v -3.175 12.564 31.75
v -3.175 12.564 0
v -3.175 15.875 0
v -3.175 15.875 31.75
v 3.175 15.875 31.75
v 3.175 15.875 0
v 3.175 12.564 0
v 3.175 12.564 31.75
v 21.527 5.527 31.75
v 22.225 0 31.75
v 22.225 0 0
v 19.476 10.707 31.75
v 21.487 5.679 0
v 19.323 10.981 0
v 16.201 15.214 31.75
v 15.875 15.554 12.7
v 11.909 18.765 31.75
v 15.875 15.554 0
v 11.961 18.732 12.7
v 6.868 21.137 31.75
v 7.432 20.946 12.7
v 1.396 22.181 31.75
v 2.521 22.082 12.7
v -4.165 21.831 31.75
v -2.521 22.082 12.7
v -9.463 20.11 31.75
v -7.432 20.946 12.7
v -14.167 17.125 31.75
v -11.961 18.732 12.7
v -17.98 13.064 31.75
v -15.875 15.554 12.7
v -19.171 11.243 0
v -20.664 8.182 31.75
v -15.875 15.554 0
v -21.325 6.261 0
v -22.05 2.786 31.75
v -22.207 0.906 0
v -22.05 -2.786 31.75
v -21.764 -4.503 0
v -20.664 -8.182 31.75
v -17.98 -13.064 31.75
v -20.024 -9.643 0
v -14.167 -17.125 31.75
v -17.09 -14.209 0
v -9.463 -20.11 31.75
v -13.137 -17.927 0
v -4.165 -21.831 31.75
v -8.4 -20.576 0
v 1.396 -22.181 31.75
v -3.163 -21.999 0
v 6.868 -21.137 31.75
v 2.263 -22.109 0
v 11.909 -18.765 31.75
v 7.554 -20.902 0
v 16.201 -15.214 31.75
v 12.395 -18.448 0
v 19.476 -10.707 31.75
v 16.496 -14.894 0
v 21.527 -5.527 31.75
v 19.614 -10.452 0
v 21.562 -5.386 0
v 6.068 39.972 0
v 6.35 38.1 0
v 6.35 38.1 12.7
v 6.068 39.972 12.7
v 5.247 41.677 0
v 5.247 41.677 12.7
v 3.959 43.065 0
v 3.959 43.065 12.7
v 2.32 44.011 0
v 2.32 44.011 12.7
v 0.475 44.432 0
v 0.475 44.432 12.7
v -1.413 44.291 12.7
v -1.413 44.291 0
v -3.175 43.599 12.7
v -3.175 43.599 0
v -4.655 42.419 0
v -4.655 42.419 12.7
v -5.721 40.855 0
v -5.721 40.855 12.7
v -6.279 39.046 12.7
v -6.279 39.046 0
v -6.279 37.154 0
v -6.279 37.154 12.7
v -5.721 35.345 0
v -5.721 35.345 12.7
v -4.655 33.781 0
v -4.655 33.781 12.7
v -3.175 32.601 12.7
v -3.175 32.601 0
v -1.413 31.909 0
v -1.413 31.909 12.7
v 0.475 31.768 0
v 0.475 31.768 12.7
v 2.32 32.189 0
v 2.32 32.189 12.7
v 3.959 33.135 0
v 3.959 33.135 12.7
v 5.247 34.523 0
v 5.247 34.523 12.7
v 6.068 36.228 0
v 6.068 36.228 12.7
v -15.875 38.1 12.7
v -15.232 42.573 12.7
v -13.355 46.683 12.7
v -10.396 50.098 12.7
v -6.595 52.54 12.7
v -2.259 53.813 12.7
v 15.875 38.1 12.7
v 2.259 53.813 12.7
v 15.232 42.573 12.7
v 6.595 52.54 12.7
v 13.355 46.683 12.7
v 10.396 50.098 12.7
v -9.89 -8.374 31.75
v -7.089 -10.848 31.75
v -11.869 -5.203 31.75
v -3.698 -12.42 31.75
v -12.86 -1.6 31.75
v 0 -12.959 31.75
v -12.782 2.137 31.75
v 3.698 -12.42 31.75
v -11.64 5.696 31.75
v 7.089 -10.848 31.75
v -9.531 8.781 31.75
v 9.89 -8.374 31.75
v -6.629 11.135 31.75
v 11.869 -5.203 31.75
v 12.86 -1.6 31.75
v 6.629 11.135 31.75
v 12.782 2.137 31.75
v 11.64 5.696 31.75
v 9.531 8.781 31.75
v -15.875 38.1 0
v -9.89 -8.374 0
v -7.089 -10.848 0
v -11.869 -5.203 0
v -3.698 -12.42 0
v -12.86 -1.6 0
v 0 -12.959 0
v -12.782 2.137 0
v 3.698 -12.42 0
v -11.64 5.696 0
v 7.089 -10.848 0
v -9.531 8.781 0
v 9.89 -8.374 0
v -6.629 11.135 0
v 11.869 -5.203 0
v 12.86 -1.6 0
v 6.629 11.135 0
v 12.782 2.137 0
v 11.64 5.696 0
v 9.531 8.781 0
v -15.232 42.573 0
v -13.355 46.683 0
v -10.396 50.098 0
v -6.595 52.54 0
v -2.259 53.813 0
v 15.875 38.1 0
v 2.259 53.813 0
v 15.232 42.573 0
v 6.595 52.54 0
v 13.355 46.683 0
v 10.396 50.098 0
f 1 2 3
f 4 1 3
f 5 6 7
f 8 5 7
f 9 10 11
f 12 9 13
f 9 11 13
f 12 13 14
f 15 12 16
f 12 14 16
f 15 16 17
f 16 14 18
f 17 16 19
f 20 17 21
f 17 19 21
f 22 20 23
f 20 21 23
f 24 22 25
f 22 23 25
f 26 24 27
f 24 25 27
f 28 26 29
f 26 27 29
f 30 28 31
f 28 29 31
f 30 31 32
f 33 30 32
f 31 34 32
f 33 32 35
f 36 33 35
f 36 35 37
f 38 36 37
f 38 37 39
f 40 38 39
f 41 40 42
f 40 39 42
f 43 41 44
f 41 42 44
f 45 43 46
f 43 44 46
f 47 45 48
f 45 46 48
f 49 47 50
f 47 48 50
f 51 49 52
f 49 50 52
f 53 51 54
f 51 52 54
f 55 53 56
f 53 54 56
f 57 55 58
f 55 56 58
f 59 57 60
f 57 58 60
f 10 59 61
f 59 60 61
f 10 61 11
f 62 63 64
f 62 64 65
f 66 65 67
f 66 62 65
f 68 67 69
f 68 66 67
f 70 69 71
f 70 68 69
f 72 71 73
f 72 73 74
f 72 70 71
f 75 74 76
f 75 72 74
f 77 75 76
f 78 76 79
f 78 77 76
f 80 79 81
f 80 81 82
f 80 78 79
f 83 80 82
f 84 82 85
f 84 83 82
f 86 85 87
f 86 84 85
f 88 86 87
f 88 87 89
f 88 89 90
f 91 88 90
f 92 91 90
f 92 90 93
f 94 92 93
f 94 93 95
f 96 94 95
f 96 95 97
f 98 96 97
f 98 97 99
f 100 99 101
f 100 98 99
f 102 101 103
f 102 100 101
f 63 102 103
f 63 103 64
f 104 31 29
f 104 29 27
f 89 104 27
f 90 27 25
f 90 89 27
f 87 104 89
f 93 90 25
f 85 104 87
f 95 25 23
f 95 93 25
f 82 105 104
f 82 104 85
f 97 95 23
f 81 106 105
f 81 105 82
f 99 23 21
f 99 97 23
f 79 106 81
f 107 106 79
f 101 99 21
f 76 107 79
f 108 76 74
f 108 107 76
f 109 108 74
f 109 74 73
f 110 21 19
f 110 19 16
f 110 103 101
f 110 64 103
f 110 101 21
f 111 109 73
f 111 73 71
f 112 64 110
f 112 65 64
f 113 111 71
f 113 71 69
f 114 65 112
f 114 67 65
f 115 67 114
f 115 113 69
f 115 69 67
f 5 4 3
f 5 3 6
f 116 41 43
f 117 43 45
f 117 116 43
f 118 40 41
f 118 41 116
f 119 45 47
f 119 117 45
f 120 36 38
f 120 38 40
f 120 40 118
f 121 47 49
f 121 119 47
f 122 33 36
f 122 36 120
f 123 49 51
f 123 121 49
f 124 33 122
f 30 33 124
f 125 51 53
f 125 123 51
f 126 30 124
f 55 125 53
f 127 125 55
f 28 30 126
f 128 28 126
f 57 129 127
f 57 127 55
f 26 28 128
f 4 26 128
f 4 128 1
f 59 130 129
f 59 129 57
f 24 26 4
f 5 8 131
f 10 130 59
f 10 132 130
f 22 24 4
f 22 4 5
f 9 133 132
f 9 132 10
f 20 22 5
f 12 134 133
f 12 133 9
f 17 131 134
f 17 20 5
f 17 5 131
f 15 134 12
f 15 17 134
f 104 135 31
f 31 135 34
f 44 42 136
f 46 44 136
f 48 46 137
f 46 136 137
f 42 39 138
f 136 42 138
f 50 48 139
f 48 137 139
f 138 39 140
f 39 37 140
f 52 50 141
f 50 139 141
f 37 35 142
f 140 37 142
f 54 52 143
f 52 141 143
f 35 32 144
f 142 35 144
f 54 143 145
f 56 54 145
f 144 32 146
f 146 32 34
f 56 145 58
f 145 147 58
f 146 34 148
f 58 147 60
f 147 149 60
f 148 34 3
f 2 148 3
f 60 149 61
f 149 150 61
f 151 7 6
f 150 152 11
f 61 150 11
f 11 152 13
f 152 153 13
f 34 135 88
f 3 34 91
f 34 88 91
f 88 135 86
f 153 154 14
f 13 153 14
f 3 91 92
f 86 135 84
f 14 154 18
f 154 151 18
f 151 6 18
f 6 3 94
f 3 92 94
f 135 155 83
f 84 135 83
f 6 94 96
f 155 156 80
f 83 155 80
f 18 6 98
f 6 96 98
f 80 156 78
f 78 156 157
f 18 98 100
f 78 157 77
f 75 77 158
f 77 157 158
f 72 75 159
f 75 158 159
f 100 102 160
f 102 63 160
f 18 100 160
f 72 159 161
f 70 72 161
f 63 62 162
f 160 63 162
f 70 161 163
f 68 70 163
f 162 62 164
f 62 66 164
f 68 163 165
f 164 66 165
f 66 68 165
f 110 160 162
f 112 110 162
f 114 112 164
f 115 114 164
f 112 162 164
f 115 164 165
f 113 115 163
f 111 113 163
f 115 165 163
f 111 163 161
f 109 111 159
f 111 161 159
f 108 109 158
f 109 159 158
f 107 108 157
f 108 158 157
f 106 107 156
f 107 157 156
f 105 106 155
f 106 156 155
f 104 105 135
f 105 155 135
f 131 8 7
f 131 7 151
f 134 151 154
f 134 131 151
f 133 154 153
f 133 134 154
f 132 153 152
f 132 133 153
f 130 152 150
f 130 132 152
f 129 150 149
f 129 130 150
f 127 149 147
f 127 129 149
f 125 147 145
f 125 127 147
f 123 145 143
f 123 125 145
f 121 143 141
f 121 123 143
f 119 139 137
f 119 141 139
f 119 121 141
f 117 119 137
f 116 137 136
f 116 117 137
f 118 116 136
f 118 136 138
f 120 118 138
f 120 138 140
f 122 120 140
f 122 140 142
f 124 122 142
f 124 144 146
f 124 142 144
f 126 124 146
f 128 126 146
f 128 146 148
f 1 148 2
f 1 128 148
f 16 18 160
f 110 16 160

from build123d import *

# Parameters (mm, degrees)
SKETCH1_R           = 22.225
BOSS_EXTRUDE1_DEPTH = 31.75
SKETCH2_R           = 6.35
BOSS_EXTRUDE2_DEPTH = 12.7
CUT_EXTRUDE1_DEPTH  = 67.447827278


with BuildPart() as part:
    # Sketch1 → Boss-Extrude1 (new body)
    with BuildSketch(Plane.XY):
        Circle(SKETCH1_R)
    extrude(amount=BOSS_EXTRUDE1_DEPTH)

    # Sketch2 → Boss-Extrude2 (add)
    with BuildSketch(Plane.XY):
        with BuildLine():
            Line((-15.875, 7.271721018), (15.875, 7.271721018))
            Line((15.875, 7.271721018), (15.875, 38.1))
            ThreePointArc((15.875, 38.1), (0, 53.975), (-15.875, 38.1))
            Line((-15.875, 38.1), (-15.875, 7.271721018))
        make_face()
        with Locations((0, 38.1)):
            Circle(SKETCH2_R, mode=Mode.SUBTRACT)
    extrude(amount=BOSS_EXTRUDE2_DEPTH)

    # Sketch3 → Cut-Extrude1 (cut, through all)
    with BuildSketch(Plane.XY.offset(31.75)):
        with BuildLine():
            Line((-3.175, 12.564048608), (-3.175, 15.875))
            Line((-3.175, 15.875), (3.175, 15.875))
            Line((3.175, 15.875), (3.175, 12.564048608))
            ThreePointArc((3.175, 12.564048608), (0, -12.959010086), (-3.175, 12.564048608))
        make_face()
    extrude(amount=-CUT_EXTRUDE1_DEPTH, mode=Mode.SUBTRACT)


solid = part.part
